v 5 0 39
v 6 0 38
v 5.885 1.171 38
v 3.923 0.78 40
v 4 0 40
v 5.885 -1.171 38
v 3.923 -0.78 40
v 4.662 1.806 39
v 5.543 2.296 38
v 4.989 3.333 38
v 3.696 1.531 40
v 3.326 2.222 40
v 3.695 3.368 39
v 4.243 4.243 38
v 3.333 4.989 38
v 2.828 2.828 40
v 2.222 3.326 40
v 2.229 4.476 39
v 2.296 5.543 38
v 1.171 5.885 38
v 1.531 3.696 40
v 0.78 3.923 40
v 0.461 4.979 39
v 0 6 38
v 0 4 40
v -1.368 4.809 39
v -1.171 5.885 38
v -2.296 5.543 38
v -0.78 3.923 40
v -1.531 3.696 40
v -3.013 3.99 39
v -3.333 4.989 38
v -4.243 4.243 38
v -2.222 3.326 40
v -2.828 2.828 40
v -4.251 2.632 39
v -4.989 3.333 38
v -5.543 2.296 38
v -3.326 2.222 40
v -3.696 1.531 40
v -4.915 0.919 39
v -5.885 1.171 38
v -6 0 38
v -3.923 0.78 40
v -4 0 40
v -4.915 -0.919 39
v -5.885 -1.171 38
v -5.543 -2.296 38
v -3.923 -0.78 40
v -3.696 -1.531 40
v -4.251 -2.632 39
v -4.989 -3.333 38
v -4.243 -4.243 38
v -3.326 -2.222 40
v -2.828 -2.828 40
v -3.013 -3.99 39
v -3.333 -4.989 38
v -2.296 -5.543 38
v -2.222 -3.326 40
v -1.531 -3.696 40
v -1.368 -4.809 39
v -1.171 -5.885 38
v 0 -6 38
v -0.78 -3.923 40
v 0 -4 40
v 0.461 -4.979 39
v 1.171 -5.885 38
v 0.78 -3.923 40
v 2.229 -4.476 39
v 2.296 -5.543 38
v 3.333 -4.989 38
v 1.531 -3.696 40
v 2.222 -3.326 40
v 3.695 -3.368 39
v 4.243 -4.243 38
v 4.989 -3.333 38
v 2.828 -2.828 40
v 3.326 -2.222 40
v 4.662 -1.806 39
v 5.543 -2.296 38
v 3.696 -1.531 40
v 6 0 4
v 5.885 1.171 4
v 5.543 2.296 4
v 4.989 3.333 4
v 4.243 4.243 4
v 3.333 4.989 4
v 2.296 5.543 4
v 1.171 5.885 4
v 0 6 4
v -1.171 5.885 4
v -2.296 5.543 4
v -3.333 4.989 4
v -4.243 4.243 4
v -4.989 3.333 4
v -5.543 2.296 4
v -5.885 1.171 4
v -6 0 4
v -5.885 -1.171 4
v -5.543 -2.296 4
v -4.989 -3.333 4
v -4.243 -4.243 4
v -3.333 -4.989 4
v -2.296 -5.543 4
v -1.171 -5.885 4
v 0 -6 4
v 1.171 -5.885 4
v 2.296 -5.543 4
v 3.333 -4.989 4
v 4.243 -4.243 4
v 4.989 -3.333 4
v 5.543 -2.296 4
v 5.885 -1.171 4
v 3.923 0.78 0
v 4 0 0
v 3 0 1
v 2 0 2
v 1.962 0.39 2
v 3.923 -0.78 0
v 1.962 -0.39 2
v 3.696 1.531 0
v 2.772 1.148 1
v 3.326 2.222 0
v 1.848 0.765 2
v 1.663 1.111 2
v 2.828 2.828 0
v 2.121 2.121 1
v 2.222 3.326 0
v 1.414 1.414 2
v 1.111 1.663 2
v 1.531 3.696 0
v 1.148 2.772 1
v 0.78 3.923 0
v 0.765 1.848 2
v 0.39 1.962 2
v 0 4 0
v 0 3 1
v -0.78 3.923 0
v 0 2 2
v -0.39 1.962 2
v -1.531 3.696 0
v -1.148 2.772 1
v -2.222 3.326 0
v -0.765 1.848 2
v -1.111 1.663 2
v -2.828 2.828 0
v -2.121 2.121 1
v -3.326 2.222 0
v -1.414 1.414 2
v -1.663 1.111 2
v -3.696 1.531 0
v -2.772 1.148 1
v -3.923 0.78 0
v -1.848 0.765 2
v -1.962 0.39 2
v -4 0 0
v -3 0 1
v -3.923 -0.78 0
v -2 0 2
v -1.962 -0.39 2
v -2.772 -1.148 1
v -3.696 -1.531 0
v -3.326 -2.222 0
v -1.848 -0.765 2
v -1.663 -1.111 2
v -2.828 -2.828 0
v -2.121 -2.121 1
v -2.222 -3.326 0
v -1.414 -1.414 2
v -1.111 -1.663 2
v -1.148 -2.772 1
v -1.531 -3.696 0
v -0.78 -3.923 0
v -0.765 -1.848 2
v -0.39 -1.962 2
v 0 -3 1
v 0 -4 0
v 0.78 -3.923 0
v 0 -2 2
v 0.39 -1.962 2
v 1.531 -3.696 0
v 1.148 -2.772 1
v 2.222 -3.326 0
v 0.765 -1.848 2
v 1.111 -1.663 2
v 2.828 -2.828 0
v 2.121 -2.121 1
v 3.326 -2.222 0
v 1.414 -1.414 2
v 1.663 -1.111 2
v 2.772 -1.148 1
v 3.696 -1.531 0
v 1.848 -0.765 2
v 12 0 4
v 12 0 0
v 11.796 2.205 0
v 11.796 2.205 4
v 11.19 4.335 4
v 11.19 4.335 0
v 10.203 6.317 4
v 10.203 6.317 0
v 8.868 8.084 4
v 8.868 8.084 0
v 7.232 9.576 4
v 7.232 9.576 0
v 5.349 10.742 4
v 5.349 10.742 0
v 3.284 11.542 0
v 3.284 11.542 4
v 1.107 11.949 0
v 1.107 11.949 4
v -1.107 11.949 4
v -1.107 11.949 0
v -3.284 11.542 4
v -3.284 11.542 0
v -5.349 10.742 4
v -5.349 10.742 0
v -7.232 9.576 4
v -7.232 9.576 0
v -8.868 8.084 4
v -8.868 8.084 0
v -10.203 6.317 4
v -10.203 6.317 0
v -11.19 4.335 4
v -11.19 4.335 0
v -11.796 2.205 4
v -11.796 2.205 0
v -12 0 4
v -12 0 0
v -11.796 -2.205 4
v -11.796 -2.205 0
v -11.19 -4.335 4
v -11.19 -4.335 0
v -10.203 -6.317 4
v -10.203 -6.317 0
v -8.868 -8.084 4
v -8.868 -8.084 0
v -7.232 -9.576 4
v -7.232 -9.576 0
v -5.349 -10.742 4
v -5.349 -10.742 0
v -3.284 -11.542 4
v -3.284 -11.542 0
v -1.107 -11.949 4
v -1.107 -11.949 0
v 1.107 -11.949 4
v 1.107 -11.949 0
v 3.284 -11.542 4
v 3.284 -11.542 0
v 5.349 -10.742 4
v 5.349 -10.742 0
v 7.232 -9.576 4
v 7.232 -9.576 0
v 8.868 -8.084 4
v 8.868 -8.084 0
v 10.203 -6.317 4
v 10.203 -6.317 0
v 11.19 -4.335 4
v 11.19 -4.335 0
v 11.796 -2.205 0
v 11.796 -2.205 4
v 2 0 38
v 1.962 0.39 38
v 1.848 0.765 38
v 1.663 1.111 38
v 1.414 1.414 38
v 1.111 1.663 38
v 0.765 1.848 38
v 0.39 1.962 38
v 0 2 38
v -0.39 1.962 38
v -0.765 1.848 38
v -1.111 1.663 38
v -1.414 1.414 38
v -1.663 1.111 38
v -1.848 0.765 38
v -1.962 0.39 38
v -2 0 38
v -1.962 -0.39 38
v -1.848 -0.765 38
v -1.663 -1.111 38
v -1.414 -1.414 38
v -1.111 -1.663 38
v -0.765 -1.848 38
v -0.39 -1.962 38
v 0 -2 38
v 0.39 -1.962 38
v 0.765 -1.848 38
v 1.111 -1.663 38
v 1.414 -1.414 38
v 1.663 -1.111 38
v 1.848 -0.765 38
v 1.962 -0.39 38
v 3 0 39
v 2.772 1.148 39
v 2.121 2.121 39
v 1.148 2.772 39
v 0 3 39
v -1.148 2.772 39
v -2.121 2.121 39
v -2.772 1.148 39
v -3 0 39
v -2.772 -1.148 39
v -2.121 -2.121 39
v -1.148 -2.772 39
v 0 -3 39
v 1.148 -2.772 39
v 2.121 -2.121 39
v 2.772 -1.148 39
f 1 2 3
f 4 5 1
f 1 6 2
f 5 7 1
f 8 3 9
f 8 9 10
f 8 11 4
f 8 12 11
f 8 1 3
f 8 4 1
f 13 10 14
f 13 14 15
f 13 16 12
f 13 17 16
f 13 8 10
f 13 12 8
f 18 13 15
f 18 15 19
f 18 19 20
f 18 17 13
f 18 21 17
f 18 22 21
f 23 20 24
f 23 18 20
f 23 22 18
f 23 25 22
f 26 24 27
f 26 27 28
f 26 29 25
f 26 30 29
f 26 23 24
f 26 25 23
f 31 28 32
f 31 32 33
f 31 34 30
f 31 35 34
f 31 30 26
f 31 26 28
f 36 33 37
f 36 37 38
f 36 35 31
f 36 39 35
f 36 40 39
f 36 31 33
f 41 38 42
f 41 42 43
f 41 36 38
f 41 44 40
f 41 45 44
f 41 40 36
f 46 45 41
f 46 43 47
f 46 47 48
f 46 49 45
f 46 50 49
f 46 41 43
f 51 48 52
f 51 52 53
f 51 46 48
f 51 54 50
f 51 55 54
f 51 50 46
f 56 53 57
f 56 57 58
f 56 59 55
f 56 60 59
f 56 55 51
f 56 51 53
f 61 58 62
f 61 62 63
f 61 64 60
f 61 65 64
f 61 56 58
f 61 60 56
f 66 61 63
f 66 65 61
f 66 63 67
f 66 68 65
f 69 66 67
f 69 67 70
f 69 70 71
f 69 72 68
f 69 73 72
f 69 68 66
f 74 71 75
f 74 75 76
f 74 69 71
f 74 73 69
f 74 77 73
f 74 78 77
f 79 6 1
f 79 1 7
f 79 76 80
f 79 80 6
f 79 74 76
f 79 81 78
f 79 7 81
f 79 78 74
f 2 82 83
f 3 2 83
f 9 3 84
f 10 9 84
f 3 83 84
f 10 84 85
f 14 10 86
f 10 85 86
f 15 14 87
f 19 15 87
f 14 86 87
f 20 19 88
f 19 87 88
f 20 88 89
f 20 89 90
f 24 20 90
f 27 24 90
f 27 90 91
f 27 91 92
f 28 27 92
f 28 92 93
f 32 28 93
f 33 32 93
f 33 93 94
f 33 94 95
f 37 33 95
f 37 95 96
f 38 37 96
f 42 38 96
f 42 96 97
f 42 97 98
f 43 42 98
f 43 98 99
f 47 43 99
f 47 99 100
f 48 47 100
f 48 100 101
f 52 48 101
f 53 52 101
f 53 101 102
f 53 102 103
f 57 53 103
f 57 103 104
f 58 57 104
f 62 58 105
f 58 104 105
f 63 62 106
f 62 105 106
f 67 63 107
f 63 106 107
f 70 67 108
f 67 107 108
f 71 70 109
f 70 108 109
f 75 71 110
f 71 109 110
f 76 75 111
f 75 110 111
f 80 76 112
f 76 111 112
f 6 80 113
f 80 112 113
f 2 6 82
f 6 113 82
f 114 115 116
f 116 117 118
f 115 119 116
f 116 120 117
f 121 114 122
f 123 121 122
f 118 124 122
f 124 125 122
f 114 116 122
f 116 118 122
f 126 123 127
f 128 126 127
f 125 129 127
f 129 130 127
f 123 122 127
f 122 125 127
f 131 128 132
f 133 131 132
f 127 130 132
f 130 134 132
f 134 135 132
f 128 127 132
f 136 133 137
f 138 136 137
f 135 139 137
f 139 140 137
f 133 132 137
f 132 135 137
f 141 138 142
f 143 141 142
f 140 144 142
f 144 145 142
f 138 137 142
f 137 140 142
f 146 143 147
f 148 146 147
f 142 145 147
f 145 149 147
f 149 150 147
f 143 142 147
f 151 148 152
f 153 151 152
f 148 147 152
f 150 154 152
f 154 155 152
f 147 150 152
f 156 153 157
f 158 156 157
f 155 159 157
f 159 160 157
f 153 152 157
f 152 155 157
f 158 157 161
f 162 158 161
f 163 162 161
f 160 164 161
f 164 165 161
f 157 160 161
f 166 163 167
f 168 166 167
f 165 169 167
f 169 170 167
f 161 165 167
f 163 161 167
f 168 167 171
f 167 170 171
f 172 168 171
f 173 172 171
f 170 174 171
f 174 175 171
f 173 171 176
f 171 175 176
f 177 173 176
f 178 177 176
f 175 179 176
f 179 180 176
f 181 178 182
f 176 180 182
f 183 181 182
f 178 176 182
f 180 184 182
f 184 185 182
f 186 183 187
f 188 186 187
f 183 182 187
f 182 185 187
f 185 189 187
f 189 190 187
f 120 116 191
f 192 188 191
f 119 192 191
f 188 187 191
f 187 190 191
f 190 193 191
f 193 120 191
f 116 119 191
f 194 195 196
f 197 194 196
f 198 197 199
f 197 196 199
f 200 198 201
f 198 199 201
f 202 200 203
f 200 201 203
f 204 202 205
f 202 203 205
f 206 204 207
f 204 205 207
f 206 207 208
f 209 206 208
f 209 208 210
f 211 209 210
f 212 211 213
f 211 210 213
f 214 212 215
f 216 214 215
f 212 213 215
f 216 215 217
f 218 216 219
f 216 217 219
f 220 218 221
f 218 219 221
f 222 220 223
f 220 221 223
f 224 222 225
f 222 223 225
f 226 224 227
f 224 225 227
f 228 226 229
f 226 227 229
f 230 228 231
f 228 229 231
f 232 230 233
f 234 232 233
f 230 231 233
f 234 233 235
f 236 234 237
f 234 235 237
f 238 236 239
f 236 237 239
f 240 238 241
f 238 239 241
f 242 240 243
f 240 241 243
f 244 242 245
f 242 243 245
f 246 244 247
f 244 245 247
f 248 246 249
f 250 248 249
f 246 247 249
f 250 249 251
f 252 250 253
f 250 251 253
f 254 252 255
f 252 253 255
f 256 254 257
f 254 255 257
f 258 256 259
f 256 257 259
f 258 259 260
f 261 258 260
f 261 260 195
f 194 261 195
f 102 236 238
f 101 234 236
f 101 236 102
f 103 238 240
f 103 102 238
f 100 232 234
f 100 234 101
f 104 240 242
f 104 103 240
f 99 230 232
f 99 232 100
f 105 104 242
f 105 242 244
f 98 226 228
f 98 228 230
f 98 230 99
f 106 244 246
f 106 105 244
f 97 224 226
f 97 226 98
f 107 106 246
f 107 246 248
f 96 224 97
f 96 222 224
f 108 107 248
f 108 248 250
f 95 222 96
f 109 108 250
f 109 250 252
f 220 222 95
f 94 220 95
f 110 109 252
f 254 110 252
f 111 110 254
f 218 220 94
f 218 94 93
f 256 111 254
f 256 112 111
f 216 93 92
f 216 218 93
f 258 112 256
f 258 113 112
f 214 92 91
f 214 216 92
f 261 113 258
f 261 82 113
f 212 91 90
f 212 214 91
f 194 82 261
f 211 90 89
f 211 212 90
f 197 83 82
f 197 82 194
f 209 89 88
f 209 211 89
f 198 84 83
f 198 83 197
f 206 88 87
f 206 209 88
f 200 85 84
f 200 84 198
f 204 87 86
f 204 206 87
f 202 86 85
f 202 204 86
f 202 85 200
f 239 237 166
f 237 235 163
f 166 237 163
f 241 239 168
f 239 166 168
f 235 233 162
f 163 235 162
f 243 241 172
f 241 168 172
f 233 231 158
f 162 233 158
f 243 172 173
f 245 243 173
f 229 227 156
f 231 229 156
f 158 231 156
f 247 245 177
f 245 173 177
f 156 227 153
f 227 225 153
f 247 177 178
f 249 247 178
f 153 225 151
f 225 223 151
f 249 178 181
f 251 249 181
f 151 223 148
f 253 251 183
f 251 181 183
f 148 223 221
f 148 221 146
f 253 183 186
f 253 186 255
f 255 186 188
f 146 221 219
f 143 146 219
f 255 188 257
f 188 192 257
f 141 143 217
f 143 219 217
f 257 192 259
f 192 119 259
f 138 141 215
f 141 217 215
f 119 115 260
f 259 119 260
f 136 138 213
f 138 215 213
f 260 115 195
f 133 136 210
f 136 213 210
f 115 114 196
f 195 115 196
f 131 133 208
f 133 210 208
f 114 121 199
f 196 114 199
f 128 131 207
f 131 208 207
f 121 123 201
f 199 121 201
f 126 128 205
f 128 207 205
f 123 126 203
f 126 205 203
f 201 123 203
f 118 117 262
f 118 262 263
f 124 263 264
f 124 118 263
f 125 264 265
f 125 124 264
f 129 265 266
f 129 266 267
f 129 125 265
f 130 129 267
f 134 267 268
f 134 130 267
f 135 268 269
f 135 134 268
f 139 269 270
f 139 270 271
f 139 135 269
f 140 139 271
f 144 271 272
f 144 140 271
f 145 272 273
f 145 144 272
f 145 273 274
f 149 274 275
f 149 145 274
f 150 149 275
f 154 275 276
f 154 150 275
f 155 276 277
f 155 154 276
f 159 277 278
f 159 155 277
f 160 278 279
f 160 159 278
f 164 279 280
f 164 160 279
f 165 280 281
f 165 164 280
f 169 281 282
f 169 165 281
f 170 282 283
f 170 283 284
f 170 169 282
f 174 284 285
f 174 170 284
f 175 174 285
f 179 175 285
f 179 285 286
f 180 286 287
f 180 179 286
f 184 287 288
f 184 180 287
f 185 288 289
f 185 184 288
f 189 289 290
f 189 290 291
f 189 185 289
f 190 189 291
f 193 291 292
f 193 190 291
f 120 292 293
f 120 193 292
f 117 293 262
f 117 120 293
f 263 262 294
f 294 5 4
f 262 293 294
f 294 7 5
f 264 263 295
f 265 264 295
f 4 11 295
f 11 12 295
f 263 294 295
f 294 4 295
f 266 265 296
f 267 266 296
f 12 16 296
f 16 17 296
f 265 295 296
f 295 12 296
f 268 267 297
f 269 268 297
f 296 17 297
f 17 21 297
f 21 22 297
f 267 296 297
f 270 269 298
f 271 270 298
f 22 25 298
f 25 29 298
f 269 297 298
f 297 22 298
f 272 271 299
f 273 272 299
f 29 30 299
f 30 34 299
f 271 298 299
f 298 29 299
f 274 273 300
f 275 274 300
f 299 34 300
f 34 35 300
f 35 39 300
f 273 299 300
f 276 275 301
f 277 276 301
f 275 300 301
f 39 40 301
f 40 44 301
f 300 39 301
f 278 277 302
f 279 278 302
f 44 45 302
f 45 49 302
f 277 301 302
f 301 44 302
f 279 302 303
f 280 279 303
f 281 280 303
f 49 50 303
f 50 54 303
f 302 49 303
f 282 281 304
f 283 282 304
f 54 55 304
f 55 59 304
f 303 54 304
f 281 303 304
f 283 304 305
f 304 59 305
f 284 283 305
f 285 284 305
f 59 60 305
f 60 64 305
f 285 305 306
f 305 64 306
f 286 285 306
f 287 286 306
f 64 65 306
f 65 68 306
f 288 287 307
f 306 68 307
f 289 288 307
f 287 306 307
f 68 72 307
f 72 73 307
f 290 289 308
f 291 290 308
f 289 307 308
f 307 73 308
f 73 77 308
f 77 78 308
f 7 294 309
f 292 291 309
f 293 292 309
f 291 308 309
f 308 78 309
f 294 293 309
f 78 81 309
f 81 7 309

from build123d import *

# Parameters (mm, degrees)
F0_R     = 6
F0_R_2   = 2
F1_DEPTH = 40
F0_R_3   = 12
F2_DEPTH = 4
F3_SIZE  = 1.99999


# Not quite as in the source:
# - a fillet or chamfer is up to 0.001 mm smaller than in the source, because OpenCascade refuses the exact size


with BuildPart() as f1:
    # F0 (on Top) → F1 (new body)
    with BuildSketch(Plane.XY):
        Circle(F0_R)
        Circle(F0_R_2, mode=Mode.SUBTRACT)
    extrude(amount=F1_DEPTH)

    # F0 (on Top) → F2 (join)
    with BuildSketch(Plane.XY):
        Circle(F0_R_3)
        Circle(F0_R, mode=Mode.SUBTRACT)
    extrude(amount=F2_DEPTH)

    # F3 (size 2 in the source; OpenCascade refuses exactly that, so slightly less here)
    f3_edges = [f1.edges().sort_by_distance(p)[0] for p in [
        (-6, 0, 40),
        (-2, 0, 40),
        (-2, 0, 0),
    ]]
    chamfer(f3_edges, length=F3_SIZE)


solid = f1.part
